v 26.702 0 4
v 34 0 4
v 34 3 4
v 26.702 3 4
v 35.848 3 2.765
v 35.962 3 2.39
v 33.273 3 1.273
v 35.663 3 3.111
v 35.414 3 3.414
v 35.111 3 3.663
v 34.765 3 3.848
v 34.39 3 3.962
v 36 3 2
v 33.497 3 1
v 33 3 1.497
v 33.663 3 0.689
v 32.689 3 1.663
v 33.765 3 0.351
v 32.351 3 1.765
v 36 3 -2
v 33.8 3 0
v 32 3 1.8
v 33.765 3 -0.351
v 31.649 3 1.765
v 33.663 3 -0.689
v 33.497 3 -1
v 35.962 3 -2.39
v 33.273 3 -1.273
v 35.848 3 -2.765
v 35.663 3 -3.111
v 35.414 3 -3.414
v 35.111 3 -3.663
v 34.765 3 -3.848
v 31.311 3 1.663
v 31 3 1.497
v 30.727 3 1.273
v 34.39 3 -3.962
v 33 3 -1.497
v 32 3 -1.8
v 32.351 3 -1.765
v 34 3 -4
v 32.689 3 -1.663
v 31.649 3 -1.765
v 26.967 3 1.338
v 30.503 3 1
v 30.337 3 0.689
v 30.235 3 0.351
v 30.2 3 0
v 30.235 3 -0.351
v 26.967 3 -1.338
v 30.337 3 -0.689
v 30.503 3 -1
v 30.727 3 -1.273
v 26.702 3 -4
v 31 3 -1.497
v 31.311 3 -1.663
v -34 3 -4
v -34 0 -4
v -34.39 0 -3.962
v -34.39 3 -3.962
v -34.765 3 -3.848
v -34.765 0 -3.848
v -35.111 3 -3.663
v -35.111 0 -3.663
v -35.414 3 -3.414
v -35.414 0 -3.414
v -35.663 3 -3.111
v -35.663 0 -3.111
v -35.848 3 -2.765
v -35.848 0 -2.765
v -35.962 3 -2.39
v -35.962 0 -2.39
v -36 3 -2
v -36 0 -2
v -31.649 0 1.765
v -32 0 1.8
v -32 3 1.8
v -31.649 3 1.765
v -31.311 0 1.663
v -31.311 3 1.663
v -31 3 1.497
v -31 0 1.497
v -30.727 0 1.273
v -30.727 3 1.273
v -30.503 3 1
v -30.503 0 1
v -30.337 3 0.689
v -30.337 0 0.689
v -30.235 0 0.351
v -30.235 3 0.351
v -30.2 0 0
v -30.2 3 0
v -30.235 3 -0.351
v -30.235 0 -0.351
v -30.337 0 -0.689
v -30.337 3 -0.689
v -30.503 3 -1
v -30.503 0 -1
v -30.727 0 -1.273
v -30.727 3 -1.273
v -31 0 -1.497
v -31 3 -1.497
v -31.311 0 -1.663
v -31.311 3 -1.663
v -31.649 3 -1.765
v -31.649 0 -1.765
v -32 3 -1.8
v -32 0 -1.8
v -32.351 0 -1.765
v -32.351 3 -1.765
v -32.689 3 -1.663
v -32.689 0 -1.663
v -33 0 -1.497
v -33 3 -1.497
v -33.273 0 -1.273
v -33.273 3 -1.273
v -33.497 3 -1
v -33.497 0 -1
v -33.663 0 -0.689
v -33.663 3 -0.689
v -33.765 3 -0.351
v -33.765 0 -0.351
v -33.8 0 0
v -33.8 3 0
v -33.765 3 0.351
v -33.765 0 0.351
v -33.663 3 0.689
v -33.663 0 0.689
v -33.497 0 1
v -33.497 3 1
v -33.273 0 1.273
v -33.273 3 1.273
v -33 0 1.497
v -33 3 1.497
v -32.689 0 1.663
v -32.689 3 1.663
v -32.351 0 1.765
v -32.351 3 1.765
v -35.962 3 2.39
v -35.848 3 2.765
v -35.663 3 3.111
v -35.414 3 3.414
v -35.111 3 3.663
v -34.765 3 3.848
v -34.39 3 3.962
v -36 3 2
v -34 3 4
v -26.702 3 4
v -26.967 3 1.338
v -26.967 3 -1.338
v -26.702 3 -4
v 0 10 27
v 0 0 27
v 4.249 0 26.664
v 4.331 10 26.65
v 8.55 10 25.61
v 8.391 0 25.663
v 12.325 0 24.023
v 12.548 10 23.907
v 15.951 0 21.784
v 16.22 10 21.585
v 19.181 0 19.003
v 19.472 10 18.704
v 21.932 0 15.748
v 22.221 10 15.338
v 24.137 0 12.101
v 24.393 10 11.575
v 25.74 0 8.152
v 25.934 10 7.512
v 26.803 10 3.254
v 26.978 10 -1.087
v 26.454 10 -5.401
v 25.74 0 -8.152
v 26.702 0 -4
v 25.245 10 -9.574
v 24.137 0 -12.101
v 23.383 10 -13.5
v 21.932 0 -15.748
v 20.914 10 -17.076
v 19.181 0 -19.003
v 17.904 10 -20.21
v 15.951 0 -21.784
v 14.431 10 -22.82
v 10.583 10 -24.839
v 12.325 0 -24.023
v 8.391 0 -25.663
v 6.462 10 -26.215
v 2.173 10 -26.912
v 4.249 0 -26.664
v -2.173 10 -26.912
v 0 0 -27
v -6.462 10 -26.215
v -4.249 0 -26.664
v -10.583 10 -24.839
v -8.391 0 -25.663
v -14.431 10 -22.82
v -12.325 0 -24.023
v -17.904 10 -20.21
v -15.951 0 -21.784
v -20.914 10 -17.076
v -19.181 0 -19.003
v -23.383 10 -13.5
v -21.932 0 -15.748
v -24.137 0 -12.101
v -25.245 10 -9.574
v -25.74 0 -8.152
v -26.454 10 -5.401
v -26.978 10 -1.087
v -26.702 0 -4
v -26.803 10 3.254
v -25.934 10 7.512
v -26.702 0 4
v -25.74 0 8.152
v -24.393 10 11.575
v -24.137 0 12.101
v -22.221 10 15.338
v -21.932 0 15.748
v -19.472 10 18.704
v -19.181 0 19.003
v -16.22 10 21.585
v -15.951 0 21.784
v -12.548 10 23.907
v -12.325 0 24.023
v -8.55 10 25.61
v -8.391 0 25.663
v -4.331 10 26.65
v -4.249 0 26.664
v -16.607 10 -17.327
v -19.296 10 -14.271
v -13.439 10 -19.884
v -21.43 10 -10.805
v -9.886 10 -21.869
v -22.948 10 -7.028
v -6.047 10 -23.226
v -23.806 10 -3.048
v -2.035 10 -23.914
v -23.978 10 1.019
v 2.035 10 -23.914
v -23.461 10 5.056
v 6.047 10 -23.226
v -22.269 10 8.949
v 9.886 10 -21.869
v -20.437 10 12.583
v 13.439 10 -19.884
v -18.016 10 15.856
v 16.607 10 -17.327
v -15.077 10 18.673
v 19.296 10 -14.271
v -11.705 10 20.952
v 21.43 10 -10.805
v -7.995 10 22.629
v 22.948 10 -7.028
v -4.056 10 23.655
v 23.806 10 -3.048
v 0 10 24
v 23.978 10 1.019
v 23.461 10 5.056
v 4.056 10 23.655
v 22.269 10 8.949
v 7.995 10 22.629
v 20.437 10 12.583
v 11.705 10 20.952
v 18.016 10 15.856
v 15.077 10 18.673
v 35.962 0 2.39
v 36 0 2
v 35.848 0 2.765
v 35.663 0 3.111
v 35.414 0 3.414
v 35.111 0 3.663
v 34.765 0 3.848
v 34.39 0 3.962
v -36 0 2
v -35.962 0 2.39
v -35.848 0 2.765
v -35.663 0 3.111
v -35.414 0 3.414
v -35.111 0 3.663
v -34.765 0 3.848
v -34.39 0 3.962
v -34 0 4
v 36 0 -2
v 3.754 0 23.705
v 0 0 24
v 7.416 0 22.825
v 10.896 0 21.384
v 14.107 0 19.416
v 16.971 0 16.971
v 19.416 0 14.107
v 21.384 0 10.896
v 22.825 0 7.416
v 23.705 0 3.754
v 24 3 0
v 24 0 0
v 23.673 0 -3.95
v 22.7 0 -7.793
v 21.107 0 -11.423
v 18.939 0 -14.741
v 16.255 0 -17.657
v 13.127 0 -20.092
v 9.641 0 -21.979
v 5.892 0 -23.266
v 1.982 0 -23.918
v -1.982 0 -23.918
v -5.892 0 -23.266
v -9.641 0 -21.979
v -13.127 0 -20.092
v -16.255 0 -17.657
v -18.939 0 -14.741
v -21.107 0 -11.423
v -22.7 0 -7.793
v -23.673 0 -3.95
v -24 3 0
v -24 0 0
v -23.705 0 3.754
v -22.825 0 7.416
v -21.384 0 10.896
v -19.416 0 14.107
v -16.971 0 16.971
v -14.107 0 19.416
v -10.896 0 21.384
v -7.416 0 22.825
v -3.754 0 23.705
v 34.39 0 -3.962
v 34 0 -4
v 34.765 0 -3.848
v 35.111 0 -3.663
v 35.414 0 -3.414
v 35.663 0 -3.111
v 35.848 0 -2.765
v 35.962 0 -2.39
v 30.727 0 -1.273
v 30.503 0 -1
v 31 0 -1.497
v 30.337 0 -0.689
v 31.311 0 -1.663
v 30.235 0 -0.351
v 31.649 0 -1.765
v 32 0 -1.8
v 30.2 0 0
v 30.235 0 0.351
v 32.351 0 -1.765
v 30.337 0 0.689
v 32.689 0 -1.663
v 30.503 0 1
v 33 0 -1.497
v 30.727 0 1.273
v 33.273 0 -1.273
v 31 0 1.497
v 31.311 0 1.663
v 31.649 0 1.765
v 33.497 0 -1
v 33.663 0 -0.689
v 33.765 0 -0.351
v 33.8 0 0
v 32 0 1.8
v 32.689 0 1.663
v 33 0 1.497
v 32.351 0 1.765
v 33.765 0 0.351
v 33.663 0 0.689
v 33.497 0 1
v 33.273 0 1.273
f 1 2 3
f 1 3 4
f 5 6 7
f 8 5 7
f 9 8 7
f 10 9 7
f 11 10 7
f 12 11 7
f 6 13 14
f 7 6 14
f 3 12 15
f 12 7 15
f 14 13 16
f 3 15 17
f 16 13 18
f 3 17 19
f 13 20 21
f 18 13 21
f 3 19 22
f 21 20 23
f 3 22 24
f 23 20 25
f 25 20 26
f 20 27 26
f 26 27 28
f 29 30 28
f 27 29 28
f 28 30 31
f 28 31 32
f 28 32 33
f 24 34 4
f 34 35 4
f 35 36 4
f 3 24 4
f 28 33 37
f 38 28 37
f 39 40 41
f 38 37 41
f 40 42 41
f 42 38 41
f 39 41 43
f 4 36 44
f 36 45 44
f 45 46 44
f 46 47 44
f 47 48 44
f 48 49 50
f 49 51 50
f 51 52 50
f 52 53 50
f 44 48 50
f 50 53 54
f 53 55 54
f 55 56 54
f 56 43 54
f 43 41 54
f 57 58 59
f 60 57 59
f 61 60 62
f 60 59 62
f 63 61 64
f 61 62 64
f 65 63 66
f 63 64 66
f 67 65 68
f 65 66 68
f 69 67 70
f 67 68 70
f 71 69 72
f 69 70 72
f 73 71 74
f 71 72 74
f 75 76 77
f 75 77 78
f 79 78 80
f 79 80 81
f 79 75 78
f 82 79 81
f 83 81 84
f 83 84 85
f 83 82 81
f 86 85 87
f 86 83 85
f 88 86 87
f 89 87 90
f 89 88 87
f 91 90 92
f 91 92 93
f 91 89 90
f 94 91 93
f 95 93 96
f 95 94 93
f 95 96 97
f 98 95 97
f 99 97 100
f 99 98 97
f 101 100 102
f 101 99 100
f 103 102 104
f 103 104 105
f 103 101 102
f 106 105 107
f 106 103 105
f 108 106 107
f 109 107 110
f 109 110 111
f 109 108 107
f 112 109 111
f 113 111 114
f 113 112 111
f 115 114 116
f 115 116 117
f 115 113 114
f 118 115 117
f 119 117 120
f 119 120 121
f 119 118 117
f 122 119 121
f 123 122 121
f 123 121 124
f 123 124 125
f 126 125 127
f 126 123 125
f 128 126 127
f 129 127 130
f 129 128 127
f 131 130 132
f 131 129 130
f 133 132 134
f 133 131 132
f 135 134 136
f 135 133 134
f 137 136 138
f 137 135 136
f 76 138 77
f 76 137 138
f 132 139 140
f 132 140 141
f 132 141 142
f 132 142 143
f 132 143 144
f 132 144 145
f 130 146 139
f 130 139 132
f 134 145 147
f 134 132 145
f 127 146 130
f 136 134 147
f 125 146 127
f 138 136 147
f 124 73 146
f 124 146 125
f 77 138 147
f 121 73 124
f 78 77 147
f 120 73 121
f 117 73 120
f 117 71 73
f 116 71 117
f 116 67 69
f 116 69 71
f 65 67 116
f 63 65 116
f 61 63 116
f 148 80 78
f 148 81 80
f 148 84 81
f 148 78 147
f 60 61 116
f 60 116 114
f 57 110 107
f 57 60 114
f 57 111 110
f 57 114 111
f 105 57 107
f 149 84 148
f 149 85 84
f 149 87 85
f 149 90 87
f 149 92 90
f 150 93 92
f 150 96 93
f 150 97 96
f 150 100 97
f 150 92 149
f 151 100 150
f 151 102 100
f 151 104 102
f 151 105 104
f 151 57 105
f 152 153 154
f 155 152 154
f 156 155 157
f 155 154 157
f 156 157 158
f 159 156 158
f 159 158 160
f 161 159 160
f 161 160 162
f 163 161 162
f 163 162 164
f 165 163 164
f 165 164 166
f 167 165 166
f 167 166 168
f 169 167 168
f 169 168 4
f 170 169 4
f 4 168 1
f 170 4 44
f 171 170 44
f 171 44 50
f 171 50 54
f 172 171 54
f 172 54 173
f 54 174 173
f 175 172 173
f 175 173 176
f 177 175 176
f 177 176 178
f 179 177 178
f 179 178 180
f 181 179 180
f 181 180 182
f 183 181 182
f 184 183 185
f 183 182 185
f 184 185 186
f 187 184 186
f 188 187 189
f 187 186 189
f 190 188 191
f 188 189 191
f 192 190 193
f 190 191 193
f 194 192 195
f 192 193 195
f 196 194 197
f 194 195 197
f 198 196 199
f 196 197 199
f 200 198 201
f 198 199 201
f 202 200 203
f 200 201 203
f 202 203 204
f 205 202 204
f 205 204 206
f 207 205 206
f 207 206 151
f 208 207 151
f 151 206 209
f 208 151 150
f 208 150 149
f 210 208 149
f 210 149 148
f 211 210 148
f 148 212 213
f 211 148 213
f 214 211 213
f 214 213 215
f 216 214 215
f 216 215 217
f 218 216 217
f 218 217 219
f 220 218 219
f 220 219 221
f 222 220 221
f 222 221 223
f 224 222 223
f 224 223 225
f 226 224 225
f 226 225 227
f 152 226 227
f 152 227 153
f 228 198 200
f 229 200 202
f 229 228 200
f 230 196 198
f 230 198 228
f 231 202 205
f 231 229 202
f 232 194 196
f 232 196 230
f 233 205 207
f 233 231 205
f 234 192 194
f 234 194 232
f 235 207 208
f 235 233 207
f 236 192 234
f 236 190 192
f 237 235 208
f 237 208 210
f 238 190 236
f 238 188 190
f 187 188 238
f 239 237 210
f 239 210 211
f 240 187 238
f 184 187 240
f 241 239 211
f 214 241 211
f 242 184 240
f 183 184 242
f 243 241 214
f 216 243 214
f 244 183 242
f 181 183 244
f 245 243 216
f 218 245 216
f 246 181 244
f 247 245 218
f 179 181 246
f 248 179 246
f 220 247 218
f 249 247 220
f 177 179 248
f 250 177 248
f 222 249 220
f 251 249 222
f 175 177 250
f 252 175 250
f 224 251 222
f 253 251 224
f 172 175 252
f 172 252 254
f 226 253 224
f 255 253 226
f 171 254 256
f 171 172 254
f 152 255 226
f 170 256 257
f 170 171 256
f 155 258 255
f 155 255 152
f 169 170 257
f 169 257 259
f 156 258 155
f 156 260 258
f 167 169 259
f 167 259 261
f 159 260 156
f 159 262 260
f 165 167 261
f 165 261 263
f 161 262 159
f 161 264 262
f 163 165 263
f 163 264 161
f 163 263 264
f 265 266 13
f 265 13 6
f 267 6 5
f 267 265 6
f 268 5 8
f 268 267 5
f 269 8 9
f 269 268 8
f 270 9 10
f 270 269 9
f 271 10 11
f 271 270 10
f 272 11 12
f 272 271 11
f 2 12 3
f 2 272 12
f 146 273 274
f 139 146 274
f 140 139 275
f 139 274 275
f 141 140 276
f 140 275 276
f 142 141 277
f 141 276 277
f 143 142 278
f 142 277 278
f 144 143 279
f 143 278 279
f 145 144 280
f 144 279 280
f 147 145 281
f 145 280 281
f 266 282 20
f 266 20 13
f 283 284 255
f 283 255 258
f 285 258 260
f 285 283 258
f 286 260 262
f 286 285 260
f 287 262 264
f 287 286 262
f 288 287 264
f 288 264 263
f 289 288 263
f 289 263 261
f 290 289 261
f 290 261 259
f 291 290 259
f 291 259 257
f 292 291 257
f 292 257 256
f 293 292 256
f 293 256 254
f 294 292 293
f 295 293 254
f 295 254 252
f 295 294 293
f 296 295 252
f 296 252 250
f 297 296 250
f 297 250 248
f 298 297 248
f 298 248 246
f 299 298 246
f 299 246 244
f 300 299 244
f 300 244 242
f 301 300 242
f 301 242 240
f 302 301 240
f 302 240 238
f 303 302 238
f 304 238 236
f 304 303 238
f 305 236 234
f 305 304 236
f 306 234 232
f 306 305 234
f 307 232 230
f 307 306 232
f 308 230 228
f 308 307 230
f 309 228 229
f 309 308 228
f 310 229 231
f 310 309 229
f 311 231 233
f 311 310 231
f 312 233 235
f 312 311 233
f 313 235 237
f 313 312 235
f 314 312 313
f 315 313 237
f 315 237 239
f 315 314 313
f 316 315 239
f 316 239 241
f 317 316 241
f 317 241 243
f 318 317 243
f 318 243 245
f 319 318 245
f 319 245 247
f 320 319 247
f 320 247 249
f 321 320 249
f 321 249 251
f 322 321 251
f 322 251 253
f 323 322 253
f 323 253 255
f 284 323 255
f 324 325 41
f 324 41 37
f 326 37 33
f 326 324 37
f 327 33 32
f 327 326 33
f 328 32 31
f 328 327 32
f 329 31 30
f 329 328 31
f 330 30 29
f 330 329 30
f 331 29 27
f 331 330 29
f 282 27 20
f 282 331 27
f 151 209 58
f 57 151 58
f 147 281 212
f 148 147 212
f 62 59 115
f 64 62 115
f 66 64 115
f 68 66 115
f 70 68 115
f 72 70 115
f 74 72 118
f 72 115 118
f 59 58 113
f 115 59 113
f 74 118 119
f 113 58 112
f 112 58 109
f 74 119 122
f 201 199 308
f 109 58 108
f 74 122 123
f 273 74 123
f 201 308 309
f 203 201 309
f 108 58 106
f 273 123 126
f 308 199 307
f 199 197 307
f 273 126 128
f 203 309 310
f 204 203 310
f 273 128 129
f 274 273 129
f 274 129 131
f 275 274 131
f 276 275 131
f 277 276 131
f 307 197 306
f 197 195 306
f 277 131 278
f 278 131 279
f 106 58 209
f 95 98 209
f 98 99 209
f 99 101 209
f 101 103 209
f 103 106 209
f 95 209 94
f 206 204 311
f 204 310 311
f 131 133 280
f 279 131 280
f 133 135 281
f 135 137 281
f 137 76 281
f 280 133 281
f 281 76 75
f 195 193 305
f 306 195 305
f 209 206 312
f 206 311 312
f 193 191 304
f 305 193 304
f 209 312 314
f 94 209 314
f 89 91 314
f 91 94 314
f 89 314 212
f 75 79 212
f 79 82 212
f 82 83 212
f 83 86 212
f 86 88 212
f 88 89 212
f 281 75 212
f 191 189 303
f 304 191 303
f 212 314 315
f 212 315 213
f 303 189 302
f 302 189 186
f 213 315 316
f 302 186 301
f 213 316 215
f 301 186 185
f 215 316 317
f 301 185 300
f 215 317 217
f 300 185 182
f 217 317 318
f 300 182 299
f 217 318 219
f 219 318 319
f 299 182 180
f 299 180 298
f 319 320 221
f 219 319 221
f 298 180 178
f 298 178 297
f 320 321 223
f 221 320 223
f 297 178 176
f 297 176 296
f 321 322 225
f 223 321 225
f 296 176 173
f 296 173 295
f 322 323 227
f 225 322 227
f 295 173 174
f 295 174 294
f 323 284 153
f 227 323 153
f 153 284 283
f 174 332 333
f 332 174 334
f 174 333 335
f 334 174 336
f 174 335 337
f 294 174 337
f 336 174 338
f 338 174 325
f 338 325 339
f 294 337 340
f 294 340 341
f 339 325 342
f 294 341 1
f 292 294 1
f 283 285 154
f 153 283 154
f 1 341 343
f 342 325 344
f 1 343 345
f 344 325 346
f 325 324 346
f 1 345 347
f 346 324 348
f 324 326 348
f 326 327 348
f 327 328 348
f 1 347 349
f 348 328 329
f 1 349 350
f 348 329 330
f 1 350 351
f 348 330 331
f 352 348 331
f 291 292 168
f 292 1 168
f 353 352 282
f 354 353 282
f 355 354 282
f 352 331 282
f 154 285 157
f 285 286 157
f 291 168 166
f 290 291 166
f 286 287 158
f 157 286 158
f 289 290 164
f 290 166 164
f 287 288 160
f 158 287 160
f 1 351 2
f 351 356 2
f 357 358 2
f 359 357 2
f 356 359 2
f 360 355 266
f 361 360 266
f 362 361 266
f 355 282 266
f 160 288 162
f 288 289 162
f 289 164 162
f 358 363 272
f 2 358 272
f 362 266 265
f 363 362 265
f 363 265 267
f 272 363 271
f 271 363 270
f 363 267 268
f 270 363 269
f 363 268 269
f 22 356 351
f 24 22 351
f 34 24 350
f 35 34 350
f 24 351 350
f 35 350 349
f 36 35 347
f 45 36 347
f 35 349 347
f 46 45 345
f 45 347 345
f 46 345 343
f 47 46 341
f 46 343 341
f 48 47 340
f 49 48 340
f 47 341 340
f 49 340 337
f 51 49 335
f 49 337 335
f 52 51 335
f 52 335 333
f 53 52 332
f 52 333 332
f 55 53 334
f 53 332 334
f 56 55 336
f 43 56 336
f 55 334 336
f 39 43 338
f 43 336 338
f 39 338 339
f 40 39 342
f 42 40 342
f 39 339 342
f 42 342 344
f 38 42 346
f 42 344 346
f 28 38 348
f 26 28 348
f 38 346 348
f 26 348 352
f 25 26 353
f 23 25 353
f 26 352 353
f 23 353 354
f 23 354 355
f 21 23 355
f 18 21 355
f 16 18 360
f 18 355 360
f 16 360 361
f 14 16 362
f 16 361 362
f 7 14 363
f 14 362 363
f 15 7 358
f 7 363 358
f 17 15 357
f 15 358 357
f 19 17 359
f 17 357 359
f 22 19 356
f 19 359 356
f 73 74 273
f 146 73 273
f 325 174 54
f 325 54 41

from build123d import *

# Parameters (mm, degrees)
SKETCH1_R           = 27
SKETCH1_R_2         = 24
BOSS_EXTRUDE1_DEPTH = 10
SKETCH3_R           = 1.8
BOSS_EXTRUDE2_DEPTH = 3


with BuildPart() as part:
    # Sketch1 → Boss-Extrude1 (new body)
    with BuildSketch(Plane(origin=(0, 0, 0), x_dir=(1, 0, 0), z_dir=(0, 1, 0))):
        with Locations(Location((0, 0, 0), (0, 0, 270))):
            Circle(SKETCH1_R)
        with Locations(Location((0, 0, 0), (0, 0, 270))):
            Circle(SKETCH1_R_2, mode=Mode.SUBTRACT)
    extrude(amount=BOSS_EXTRUDE1_DEPTH)

    # Sketch3 → Boss-Extrude2 (add)
    with BuildSketch(Plane(origin=(0, 0, 0), x_dir=(1, 0, 0), z_dir=(0, 1, 0))):
        with BuildLine():
            Line((-24, 0), (-24, 4))
            Line((-24, 4), (-34, 4))
            ThreePointArc((-34, 4), (-35.414213562, 3.414213562), (-36, 2))
            Line((-36, 2), (-36, -2))
            ThreePointArc((-36, -2), (-35.414213562, -3.414213562), (-34, -4))
            Line((-34, -4), (-24, -4))
            Line((-24, -4), (-24, 0))
        make_face()
        with Locations(Location((-32, 0, 0), (0, 0, 270))):
            Circle(SKETCH3_R, mode=Mode.SUBTRACT)
    boss_extrude2 = extrude(amount=BOSS_EXTRUDE2_DEPTH)

    # Mirror1: Boss-Extrude2 across plane
    add(boss_extrude2.mirror(Plane(origin=(0, 0, 0), x_dir=(0, 0, 1), z_dir=(1, 0, 0))))


solid = part.part
